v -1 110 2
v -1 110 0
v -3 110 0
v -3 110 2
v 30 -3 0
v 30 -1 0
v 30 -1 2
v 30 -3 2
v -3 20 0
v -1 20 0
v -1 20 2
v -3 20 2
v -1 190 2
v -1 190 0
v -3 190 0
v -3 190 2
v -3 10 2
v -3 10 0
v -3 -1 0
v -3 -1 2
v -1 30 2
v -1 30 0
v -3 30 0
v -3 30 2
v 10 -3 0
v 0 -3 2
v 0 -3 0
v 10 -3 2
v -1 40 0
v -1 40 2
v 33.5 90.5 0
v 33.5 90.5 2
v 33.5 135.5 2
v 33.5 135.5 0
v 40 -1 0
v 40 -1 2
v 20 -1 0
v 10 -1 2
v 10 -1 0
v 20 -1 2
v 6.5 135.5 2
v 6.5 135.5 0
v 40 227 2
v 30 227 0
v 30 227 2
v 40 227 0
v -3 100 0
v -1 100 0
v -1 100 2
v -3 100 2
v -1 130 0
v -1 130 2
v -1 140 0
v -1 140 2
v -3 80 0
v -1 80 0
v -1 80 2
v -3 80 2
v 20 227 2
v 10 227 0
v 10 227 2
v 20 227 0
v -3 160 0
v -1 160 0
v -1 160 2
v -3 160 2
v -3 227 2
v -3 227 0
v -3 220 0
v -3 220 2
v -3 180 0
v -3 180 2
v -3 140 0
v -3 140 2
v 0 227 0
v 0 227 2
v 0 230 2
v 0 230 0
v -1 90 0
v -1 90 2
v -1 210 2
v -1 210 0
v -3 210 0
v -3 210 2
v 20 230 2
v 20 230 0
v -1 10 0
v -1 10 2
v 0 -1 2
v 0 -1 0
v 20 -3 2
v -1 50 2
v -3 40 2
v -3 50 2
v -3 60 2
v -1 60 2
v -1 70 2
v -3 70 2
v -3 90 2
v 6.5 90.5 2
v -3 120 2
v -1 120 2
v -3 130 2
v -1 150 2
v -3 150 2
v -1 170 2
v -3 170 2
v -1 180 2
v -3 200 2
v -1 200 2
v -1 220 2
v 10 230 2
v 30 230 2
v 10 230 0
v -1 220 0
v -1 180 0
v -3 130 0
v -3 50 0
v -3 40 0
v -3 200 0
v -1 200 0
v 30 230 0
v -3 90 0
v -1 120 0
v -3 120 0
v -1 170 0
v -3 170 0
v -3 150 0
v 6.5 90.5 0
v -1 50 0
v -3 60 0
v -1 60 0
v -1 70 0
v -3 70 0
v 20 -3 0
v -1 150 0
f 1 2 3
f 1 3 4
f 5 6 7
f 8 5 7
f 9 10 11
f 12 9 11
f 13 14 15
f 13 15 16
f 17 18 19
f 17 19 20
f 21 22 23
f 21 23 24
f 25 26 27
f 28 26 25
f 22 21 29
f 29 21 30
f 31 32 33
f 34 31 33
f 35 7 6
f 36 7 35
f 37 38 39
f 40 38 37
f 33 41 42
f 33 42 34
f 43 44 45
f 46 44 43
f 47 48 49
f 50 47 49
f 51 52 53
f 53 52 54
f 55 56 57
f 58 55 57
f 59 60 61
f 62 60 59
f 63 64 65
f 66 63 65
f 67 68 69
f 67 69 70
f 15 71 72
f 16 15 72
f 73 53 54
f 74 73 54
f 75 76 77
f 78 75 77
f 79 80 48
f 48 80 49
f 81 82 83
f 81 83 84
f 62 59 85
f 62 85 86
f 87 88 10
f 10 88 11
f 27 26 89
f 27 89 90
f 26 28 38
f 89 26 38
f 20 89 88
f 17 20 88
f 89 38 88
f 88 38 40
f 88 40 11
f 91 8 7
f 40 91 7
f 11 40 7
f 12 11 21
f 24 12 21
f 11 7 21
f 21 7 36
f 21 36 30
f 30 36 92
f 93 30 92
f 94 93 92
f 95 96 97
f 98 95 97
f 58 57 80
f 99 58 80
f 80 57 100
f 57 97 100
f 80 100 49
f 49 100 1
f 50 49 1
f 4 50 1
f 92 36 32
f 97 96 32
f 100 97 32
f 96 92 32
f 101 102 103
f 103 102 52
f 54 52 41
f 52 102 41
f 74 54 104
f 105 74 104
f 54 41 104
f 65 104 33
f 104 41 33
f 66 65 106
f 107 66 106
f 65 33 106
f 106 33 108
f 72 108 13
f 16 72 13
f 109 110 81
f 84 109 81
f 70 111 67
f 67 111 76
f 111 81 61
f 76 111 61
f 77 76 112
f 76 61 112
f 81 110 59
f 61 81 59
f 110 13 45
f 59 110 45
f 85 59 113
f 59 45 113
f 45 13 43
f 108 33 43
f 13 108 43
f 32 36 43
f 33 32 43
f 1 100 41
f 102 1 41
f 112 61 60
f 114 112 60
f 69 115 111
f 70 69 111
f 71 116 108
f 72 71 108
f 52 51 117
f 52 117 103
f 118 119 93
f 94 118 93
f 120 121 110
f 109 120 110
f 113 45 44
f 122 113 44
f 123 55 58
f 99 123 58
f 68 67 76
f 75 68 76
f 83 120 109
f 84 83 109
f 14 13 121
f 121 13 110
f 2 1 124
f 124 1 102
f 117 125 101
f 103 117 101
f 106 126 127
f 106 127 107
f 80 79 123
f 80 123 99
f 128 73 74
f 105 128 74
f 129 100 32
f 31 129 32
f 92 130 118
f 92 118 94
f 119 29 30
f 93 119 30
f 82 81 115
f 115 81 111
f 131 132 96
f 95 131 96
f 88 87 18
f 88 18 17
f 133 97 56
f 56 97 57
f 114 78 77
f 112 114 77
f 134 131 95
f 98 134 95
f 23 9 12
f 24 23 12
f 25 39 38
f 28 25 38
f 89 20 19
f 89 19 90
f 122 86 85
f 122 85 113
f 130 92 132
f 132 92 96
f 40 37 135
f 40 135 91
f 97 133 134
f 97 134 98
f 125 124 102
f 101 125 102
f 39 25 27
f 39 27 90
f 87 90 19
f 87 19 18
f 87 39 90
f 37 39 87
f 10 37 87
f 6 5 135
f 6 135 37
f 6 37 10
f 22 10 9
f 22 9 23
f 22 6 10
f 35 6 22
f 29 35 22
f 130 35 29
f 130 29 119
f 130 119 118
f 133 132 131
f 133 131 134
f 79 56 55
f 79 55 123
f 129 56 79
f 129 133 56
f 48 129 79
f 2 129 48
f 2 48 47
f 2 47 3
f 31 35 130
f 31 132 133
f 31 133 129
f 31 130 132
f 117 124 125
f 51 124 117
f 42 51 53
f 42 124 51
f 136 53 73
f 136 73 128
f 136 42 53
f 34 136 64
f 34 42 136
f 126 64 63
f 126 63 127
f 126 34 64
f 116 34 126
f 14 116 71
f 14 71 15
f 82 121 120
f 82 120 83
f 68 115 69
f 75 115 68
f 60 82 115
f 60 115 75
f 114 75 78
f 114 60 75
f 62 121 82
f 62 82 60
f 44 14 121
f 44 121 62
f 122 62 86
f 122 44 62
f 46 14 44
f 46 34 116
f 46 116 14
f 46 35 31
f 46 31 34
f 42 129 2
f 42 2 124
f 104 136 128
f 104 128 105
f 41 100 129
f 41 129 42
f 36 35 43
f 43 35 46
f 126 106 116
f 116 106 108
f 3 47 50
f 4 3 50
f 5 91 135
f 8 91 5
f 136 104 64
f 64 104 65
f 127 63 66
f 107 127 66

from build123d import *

# Parameters (mm, degrees)
SKETCH1_W               = 40
SKETCH1_H               = 227
BOSS_EXTRUDE1_DEPTH     = 2
SKETCH2_W               = 10
SKETCH2_H               = 2
BOSS_EXTRUDE2_DEPTH     = 3
LPATTERN1_COUNT         = 2
LPATTERN1_PITCH         = 20
SKETCH3_W               = 10
SKETCH3_H               = 2
BOSS_EXTRUDE3_DEPTH     = 3
LPATTERN2_COUNT         = 2
LPATTERN2_PITCH         = 20
SKETCH4_W               = 2
SKETCH4_H               = 10
BOSS_EXTRUDE4_DEPTH     = 3
LPATTERN3_COUNT         = 12
LPATTERN3_PITCH         = 20
ESQUISSE1_W             = 3
ESQUISSE1_H             = 3
ENL_V_MAT_EXTRU_1_DEPTH = 3
ESQUISSE2_W             = 1
ESQUISSE2_H             = 227
ESQUISSE2_W_2           = 43
ESQUISSE2_H_2           = 1
BOSS_EXTRU_1_DEPTH      = 2
ESQUISSE4_W             = 27
ESQUISSE4_H             = 45
ENL_V_MAT_EXTRU_2_DEPTH = 3


with BuildPart() as part:
    # Sketch1 → Boss-Extrude1 (new body)
    with BuildSketch(Plane.XY):
        with Locations((20, 113.5)):
            Rectangle(SKETCH1_W, SKETCH1_H)
    extrude(amount=BOSS_EXTRUDE1_DEPTH)

    # Sketch2 → Boss-Extrude2 (add)
    with BuildSketch(Plane.XZ):
        with Locations((25, 1)):
            Rectangle(SKETCH2_W, SKETCH2_H)
    boss_extrude2 = extrude(amount=BOSS_EXTRUDE2_DEPTH)

    # LPattern1: Boss-Extrude2 ×2
    with Locations(*[(-i * LPATTERN1_PITCH, 0, 0) for i in range(1, LPATTERN1_COUNT)]):
        add(boss_extrude2)

    # Sketch3 → Boss-Extrude3 (add)
    with BuildSketch(Plane(origin=(0, 227, 0), x_dir=(1, 0, 0), z_dir=(0, 1, 0))):
        with Locations((25, -1)):
            Rectangle(SKETCH3_W, SKETCH3_H)
    boss_extrude3 = extrude(amount=BOSS_EXTRUDE3_DEPTH)

    # LPattern2: Boss-Extrude3 ×2
    with Locations(*[(-i * LPATTERN2_PITCH, 0, 0) for i in range(1, LPATTERN2_COUNT)]):
        add(boss_extrude3)

    # Sketch4 → Boss-Extrude4 (add)
    with BuildSketch(Plane.ZY):
        with Locations((1, 5)):
            Rectangle(SKETCH4_W, SKETCH4_H)
    boss_extrude4 = extrude(amount=BOSS_EXTRUDE4_DEPTH)

    # LPattern3: Boss-Extrude4 ×12
    with Locations(*[(0, i * LPATTERN3_PITCH, 0) for i in range(1, LPATTERN3_COUNT)]):
        add(boss_extrude4)

    # Esquisse1 → Enlèv. mat.-Extru.1 (cut, through all)
    with BuildSketch(Plane.XY.offset(2)):
        with Locations((-1.5, 228.5)):
            Rectangle(ESQUISSE1_W, ESQUISSE1_H)
    extrude(amount=-ENL_V_MAT_EXTRU_1_DEPTH, mode=Mode.SUBTRACT)

    # Esquisse2 → Boss.-Extru.1 (add)
    with BuildSketch(Plane.XY.offset(2)):
        with Locations((-0.5, 113.5)):
            Rectangle(ESQUISSE2_W, ESQUISSE2_H)
        with Locations((18.5, -0.5)):
            Rectangle(ESQUISSE2_W_2, ESQUISSE2_H_2)
    extrude(amount=-BOSS_EXTRU_1_DEPTH)

    # Esquisse4 → Enlèv. mat.-Extru.2 (cut)
    with BuildSketch(Plane.XY.offset(2)):
        with Locations((20, 113)):
            Rectangle(ESQUISSE4_W, ESQUISSE4_H)
    extrude(amount=-ENL_V_MAT_EXTRU_2_DEPTH, mode=Mode.SUBTRACT)


solid = part.part
